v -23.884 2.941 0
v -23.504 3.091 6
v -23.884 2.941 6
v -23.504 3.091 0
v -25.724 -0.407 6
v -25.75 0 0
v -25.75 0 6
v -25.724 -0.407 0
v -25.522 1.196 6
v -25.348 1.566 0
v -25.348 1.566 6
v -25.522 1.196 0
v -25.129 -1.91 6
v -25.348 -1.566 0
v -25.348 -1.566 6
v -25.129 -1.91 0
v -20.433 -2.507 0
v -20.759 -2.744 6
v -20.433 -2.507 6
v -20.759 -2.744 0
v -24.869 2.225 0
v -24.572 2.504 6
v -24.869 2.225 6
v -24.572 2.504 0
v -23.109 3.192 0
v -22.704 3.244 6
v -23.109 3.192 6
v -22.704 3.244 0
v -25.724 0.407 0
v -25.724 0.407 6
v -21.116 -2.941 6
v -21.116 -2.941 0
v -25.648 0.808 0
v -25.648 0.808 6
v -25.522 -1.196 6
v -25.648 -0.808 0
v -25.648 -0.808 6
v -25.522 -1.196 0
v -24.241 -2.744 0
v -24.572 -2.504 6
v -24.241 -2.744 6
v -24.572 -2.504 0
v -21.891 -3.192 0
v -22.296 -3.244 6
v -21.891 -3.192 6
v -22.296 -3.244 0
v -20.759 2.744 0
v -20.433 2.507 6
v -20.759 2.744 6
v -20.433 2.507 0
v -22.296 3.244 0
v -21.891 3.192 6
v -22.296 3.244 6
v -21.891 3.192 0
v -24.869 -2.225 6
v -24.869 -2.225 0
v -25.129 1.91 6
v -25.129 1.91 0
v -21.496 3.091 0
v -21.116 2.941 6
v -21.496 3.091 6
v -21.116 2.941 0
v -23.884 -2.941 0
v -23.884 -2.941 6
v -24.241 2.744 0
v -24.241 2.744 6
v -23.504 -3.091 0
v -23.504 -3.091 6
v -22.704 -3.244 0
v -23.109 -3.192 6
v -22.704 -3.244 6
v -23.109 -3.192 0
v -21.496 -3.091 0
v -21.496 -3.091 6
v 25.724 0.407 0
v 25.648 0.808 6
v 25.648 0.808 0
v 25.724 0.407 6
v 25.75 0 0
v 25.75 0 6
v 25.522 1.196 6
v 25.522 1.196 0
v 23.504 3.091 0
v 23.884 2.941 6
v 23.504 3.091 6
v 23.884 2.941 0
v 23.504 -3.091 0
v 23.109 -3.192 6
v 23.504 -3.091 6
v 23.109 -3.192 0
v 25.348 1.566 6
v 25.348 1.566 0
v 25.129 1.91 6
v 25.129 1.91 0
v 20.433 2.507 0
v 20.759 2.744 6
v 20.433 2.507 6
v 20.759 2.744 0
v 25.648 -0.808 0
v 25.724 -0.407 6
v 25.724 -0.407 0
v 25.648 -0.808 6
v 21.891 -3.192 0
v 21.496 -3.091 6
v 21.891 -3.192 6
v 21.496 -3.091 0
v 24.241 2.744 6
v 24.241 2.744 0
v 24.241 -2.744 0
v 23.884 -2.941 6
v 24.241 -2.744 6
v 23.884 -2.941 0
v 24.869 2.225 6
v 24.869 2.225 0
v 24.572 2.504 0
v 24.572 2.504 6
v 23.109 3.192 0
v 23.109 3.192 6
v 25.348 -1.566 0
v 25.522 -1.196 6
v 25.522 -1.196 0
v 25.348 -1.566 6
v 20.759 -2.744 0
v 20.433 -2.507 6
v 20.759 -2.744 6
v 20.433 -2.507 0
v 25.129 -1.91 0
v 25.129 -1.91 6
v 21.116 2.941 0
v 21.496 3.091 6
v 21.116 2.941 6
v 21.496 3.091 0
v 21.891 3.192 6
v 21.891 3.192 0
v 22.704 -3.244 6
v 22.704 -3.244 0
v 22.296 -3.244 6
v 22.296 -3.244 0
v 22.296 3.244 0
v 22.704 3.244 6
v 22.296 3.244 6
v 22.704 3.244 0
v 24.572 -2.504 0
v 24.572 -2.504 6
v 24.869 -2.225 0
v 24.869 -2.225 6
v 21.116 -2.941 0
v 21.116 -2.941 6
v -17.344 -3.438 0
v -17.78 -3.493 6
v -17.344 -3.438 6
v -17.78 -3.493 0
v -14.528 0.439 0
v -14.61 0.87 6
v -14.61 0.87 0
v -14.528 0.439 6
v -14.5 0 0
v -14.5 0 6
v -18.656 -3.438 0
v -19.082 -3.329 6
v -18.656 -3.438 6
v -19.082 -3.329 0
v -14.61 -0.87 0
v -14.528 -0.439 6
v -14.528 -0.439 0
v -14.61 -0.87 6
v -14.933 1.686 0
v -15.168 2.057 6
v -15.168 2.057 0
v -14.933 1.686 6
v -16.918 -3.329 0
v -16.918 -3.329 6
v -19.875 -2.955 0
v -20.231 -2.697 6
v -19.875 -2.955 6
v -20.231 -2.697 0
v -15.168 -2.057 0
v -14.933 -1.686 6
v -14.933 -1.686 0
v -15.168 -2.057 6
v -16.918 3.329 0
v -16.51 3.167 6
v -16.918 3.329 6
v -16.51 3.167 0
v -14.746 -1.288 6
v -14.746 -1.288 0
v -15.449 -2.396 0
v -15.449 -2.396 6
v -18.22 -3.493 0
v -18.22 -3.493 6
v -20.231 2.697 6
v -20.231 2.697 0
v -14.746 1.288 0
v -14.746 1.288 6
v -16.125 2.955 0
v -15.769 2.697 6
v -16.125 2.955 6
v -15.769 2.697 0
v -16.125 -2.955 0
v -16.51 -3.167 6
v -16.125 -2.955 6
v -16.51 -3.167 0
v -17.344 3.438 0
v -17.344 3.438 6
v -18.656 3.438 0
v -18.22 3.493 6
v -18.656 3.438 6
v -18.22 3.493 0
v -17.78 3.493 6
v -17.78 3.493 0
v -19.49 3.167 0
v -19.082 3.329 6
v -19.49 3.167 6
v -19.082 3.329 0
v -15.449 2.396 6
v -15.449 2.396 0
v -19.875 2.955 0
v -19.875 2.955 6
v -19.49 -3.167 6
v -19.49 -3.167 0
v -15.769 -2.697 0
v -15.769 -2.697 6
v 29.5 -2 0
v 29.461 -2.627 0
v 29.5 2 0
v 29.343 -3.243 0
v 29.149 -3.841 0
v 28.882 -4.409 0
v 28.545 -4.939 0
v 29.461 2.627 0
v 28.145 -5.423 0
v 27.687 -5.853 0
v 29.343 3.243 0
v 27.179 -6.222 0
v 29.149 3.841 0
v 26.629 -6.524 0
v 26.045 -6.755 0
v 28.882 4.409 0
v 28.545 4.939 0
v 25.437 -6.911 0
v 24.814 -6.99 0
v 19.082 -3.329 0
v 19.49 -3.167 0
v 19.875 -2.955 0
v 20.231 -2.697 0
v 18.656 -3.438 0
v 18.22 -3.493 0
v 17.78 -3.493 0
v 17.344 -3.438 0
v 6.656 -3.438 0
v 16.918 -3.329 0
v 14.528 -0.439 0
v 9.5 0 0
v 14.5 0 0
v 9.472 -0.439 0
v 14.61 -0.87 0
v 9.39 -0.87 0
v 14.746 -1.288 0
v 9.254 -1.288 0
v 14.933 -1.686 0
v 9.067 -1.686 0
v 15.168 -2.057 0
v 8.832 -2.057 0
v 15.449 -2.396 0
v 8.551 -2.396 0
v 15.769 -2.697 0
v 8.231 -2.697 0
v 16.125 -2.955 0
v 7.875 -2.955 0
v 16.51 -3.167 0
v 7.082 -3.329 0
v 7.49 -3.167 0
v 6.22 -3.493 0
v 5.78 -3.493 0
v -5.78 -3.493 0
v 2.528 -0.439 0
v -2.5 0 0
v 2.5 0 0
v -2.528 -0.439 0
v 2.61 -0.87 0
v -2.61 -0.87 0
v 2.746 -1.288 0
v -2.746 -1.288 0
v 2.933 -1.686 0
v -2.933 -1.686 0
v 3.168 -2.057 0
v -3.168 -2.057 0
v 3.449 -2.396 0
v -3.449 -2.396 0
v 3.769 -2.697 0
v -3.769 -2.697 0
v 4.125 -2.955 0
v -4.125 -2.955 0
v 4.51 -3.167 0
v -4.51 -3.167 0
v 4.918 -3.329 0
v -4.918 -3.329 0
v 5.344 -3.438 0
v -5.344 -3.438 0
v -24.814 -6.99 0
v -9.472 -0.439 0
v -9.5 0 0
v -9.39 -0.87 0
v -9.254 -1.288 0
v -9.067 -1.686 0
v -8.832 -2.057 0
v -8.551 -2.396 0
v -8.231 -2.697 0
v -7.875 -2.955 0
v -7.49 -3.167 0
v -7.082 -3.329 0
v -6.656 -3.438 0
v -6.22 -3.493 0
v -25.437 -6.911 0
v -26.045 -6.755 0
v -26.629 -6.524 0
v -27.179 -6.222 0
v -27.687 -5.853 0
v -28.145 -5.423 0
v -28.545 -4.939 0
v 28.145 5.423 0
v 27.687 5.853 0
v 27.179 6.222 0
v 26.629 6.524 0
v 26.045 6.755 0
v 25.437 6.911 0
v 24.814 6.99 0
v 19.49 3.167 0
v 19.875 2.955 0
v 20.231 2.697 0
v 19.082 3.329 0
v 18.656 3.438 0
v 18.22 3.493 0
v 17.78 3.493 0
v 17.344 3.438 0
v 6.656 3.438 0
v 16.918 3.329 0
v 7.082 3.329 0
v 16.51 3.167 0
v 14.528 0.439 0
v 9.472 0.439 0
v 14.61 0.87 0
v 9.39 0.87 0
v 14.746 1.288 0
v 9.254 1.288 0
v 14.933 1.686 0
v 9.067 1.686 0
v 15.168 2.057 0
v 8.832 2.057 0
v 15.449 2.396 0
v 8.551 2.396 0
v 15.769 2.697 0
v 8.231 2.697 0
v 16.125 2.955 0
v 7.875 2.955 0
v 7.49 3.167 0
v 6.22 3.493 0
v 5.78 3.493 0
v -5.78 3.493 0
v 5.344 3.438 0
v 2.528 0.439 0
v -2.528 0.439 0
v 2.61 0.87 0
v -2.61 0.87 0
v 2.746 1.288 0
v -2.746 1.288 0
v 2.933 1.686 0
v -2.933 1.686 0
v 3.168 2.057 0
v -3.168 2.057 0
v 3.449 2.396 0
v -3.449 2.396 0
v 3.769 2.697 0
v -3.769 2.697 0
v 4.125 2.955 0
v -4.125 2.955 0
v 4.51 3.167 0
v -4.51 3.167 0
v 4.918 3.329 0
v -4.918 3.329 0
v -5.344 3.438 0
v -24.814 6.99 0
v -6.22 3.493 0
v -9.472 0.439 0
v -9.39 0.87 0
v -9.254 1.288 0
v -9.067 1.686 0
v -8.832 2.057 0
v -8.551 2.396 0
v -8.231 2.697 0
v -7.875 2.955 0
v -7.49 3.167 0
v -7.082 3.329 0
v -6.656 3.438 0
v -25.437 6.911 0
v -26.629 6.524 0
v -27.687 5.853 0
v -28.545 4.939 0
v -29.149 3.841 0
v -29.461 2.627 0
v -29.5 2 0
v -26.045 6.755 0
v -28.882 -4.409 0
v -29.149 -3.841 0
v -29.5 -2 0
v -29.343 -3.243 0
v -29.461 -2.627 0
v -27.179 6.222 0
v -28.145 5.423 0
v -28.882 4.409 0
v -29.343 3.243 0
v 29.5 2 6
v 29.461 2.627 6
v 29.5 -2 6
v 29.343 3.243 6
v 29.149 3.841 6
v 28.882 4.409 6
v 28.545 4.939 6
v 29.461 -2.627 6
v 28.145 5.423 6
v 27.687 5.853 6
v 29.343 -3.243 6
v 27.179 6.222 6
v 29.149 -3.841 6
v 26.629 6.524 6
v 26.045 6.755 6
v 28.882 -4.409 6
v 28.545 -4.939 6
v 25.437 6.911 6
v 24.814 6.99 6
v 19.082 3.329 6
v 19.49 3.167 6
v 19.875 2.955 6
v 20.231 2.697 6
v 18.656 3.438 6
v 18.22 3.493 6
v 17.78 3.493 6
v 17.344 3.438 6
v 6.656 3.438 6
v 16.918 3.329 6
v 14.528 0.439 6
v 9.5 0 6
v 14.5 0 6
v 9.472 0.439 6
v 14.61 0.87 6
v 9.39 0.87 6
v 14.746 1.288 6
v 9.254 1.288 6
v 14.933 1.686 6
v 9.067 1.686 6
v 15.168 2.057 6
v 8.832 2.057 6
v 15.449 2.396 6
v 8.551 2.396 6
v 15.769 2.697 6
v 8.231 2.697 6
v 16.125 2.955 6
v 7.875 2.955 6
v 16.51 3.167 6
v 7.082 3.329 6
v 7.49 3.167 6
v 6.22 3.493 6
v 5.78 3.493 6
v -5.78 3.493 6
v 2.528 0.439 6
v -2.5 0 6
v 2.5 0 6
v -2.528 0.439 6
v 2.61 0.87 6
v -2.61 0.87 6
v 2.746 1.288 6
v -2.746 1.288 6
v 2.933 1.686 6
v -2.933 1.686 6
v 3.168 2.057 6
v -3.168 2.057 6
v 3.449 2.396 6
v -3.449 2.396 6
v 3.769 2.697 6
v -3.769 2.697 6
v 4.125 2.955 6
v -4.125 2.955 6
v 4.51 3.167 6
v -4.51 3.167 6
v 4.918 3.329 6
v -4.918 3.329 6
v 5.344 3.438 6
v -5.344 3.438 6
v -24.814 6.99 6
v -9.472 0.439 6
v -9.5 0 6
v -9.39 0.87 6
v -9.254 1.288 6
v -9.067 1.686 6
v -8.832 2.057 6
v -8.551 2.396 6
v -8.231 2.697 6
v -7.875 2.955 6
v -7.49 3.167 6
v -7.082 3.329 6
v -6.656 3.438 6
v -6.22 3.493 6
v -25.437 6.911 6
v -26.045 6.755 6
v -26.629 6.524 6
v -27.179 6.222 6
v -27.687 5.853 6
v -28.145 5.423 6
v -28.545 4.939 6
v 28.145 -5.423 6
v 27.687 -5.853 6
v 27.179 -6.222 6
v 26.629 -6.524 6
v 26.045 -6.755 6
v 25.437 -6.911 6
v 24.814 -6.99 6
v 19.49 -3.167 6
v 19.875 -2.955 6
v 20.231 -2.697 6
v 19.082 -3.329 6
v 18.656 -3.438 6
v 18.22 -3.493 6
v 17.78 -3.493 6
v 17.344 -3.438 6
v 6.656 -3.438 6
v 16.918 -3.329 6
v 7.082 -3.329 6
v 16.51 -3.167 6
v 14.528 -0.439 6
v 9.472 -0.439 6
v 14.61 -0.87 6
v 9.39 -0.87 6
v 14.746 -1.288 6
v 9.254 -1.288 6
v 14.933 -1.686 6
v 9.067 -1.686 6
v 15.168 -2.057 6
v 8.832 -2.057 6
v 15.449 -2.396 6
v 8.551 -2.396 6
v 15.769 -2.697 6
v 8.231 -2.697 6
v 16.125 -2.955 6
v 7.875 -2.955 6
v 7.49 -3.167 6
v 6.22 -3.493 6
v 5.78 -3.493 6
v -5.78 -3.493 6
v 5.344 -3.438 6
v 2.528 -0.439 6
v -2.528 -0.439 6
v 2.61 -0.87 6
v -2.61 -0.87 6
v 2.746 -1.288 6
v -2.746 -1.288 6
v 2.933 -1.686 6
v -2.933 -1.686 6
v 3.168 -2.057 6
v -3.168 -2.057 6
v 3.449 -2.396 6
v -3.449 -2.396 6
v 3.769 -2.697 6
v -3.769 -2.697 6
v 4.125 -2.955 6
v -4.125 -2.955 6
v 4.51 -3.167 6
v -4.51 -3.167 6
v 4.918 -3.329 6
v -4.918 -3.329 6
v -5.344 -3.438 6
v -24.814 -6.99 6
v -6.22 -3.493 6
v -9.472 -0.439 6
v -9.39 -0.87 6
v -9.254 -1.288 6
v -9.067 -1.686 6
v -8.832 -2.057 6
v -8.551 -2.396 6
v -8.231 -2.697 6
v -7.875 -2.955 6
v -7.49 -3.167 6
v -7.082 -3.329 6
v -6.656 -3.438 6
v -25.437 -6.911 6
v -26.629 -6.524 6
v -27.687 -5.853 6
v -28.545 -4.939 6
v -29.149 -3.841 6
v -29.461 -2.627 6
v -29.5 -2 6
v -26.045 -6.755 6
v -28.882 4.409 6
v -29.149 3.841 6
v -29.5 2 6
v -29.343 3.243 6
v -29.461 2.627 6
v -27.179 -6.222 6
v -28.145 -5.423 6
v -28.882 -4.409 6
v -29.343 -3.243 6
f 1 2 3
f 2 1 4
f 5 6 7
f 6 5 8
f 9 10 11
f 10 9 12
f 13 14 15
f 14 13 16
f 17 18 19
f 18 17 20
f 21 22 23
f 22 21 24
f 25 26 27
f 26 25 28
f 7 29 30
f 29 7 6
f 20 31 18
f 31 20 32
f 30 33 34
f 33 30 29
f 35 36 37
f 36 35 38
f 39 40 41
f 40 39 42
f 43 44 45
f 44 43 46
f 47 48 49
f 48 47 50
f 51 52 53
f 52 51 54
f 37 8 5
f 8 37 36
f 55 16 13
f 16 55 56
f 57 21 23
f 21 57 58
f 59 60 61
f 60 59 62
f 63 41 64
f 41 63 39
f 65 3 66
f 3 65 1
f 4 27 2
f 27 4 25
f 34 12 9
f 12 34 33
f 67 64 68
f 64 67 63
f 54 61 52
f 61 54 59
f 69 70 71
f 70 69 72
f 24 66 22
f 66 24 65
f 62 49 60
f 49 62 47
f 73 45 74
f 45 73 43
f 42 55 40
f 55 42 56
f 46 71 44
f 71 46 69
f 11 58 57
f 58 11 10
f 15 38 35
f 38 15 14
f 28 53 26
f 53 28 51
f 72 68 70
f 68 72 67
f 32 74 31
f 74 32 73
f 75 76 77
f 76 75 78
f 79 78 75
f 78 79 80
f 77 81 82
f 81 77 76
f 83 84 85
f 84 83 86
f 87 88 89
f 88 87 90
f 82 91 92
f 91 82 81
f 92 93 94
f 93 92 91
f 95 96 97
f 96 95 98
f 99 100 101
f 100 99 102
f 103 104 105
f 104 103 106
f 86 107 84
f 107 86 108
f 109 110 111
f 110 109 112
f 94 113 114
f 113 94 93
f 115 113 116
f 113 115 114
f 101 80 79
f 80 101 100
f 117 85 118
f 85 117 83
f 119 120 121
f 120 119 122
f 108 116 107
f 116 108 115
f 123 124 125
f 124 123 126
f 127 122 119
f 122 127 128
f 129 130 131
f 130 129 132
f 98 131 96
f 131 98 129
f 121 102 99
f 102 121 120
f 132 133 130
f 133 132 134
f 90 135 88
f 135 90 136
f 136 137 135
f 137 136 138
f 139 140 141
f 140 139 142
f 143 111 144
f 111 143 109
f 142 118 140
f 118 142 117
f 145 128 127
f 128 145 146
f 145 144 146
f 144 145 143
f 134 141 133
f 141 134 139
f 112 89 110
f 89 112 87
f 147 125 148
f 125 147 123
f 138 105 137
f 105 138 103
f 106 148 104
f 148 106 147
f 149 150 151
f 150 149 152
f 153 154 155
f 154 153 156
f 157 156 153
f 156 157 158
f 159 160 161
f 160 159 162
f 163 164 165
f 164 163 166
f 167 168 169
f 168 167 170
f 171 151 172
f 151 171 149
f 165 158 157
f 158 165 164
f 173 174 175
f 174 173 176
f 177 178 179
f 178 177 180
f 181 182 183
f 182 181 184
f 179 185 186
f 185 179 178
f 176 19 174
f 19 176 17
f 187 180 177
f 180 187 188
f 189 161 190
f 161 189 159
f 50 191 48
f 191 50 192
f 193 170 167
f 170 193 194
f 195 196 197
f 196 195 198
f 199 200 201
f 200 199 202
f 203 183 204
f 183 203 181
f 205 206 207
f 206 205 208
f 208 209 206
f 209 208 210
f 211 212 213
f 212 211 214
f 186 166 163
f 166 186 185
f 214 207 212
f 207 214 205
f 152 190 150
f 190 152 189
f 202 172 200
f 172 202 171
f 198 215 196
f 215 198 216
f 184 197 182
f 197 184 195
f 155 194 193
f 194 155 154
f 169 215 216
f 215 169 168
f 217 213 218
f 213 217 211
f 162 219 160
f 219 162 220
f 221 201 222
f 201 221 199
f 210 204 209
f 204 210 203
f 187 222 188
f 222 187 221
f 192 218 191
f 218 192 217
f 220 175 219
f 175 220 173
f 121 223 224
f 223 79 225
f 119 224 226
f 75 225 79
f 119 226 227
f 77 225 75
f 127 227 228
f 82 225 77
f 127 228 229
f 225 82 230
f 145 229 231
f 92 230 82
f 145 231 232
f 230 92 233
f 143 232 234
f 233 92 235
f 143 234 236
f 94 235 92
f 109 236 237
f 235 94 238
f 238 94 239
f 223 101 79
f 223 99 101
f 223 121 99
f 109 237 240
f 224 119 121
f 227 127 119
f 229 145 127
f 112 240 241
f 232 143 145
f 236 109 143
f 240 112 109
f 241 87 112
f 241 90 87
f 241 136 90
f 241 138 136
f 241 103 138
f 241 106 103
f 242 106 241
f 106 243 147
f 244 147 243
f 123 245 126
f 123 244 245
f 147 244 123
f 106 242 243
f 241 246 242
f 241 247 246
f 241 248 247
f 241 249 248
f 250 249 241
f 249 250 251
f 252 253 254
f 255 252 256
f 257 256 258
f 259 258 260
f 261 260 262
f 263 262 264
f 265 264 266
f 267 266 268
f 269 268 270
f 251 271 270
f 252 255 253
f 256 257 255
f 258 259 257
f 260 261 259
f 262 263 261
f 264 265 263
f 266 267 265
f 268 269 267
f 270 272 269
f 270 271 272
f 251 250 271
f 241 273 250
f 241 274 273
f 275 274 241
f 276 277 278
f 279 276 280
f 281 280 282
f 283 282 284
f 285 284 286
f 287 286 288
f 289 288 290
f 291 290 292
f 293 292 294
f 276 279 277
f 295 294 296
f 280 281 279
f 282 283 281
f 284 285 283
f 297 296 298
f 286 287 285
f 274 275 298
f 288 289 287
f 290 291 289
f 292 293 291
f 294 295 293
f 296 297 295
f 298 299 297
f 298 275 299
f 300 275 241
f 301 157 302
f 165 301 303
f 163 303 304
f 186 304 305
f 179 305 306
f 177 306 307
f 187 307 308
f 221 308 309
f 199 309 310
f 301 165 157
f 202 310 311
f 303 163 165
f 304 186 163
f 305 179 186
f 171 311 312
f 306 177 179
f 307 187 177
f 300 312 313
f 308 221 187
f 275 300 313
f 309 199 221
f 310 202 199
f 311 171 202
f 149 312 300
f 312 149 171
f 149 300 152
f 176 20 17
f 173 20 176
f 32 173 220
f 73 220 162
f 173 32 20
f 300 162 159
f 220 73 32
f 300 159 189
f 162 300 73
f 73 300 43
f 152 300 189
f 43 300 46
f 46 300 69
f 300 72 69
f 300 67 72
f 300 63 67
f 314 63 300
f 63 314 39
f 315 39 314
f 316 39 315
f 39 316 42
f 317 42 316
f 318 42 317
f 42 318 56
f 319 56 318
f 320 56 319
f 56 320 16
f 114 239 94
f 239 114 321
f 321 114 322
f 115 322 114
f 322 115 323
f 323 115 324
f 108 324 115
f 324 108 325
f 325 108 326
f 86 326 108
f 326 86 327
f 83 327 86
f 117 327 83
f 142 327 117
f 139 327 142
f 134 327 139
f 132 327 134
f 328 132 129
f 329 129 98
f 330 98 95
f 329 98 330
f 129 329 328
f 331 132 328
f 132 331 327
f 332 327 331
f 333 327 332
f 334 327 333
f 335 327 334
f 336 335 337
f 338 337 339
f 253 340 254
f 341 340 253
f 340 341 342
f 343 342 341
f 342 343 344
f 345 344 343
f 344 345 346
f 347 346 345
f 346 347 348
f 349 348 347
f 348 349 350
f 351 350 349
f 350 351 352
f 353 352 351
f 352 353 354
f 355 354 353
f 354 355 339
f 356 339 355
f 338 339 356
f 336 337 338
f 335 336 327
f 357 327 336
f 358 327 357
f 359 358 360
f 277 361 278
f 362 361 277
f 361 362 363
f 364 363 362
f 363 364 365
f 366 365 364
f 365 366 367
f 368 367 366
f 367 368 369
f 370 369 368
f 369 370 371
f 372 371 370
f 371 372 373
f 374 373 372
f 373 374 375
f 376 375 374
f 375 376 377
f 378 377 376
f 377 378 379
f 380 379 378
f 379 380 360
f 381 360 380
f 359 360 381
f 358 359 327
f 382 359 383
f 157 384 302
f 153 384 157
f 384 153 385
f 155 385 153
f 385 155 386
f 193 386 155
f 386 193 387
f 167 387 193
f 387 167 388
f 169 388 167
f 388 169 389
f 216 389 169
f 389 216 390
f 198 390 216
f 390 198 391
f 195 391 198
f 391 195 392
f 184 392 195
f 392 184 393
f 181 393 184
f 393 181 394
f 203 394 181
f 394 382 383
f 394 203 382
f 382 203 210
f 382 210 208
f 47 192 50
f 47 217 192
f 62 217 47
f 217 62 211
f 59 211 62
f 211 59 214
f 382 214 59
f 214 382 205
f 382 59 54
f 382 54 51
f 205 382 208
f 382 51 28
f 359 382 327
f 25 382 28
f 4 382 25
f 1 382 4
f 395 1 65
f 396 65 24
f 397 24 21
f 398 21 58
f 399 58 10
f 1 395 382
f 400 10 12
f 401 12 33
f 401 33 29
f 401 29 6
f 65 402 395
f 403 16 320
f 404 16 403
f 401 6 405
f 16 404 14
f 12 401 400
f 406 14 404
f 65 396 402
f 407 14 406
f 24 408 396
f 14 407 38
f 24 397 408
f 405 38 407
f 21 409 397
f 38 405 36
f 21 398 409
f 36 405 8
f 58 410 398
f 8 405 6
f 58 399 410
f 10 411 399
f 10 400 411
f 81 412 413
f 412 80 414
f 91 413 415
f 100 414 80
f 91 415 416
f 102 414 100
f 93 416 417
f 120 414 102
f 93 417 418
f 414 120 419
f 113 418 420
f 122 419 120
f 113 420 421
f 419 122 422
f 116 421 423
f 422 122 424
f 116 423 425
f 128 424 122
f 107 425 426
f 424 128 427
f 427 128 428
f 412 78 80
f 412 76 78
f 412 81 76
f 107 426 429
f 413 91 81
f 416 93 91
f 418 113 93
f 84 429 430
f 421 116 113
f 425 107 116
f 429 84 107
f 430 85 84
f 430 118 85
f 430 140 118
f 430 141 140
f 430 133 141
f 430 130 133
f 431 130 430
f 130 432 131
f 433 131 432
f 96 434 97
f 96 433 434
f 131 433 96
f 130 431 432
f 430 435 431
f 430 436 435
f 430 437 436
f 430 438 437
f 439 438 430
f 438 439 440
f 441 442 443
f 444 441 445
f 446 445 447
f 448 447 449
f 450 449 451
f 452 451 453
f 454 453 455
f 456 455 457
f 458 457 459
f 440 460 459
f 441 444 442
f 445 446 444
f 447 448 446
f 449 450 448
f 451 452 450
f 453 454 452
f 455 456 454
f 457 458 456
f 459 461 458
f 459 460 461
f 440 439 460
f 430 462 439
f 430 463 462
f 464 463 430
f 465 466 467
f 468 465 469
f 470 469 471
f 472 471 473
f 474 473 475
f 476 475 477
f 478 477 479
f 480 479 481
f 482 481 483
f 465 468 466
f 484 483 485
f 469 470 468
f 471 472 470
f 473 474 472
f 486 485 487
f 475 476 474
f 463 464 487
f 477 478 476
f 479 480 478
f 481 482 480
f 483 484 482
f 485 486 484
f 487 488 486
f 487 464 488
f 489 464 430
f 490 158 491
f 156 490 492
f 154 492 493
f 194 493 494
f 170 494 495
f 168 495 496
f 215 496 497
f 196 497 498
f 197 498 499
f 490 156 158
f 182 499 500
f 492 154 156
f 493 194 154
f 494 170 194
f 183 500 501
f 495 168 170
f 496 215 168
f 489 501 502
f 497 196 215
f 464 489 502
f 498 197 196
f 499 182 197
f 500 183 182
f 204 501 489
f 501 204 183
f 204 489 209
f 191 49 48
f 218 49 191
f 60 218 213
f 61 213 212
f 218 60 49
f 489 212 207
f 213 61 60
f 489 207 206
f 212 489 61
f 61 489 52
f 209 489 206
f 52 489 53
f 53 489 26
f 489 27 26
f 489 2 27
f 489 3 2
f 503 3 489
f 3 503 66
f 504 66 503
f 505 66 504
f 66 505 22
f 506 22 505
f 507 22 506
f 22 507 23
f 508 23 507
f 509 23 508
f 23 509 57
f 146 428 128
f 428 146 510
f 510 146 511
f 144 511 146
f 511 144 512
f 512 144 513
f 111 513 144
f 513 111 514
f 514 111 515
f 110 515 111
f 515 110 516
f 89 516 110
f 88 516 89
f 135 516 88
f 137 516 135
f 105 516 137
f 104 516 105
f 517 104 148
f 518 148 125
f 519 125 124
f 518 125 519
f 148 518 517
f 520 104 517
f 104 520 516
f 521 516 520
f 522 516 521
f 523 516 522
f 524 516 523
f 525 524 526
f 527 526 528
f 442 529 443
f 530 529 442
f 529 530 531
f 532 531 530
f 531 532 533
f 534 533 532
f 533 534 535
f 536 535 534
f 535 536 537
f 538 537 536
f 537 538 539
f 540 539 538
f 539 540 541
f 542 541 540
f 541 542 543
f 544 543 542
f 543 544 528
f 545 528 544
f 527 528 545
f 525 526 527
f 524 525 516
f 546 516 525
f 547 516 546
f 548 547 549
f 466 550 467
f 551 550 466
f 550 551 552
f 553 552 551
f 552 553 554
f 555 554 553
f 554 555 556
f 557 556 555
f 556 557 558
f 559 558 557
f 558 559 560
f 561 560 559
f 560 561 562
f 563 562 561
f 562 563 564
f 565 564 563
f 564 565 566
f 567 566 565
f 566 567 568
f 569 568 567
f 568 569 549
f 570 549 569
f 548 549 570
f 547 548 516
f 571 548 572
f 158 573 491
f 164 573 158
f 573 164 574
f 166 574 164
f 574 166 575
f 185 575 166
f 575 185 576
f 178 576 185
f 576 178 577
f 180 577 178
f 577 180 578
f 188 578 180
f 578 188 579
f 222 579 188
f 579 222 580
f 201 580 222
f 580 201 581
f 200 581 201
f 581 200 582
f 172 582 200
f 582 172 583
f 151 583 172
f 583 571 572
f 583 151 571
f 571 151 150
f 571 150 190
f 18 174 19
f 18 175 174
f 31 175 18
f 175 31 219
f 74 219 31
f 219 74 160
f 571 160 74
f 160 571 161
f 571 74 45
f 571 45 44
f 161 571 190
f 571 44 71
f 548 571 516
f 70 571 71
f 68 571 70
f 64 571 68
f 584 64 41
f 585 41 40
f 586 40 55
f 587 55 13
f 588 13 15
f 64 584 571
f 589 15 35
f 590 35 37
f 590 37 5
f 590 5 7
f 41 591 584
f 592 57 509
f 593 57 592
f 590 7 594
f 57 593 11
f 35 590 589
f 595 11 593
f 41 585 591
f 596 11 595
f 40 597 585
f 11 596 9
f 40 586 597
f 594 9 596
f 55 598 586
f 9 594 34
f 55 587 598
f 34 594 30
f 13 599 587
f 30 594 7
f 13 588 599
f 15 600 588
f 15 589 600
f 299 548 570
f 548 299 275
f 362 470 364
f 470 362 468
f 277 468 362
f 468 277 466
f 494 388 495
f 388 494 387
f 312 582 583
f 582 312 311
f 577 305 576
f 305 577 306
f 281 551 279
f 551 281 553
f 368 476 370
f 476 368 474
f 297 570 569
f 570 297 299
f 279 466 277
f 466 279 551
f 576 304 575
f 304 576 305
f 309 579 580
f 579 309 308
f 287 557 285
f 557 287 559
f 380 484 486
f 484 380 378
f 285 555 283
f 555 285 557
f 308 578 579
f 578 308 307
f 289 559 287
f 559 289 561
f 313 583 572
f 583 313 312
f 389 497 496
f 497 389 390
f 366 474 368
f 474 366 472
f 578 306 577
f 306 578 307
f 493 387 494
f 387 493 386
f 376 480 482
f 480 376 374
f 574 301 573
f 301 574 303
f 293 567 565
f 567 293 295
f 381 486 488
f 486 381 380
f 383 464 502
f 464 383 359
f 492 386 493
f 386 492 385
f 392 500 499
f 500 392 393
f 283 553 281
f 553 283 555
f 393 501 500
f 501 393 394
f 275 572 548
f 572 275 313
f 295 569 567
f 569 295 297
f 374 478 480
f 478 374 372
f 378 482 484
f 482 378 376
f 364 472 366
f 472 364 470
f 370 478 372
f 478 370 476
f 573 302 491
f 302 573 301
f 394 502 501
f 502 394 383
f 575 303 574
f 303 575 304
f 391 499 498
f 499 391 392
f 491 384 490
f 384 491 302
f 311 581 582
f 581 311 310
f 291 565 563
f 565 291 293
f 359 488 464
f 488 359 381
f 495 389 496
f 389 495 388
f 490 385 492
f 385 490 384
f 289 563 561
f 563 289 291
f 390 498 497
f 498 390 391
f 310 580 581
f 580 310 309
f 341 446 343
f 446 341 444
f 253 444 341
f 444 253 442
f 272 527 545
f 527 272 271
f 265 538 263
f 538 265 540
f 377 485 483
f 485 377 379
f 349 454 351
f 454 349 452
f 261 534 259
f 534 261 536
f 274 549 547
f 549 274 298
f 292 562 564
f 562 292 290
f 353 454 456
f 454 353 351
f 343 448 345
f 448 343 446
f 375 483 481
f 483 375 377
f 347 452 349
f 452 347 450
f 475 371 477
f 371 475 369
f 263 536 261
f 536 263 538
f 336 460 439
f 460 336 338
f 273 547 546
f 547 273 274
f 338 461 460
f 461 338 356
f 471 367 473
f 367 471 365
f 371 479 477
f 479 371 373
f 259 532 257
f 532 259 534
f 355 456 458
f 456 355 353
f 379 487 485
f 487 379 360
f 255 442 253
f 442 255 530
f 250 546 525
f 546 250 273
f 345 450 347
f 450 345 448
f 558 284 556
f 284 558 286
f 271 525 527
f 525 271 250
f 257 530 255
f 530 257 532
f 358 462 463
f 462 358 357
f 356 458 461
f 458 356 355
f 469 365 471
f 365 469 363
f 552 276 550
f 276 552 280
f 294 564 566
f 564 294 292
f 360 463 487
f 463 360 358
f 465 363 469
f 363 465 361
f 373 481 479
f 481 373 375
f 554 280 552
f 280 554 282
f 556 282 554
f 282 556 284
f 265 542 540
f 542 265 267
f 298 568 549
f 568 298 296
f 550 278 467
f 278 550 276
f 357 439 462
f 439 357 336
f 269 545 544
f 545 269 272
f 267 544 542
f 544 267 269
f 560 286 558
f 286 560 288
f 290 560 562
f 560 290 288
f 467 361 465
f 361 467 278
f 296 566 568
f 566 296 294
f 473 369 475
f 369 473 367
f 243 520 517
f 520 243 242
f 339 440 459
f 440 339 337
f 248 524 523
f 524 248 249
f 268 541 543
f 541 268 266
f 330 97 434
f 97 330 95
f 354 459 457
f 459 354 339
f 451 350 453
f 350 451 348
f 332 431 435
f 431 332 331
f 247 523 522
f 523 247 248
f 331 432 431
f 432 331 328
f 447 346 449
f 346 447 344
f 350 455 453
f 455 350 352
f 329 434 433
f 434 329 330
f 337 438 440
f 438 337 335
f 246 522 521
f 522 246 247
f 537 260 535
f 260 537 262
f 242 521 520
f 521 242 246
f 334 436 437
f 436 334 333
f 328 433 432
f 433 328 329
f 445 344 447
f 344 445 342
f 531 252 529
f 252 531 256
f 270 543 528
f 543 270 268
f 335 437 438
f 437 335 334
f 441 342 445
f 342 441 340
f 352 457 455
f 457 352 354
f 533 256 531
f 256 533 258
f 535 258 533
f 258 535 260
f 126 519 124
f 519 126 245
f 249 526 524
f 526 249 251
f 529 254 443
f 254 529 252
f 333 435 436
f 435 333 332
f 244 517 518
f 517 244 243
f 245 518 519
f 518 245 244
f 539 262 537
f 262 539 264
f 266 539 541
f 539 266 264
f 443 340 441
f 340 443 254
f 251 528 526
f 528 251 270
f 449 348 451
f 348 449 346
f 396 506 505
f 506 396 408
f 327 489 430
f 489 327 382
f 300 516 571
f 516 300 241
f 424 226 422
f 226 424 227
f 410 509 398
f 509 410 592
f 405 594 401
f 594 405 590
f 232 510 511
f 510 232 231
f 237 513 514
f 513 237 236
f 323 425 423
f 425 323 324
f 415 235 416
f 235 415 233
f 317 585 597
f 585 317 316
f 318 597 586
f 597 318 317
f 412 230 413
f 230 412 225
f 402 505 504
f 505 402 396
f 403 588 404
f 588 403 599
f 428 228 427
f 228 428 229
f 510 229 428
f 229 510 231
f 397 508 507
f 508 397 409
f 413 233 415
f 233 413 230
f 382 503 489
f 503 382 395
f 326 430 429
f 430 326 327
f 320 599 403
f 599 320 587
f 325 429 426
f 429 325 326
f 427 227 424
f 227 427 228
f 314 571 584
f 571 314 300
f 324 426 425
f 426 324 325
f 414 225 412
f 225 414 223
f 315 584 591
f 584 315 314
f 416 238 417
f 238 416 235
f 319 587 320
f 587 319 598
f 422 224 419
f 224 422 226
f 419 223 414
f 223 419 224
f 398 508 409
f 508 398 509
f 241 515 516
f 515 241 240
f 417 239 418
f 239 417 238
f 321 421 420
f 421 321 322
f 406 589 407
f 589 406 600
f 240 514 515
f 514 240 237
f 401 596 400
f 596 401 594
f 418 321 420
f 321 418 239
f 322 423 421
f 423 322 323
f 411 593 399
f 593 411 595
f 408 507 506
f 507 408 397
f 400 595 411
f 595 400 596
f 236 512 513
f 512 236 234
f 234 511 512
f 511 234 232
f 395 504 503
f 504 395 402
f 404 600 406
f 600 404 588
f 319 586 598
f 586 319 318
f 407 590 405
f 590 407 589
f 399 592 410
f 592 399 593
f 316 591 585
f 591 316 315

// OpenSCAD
$fn = 50;


difference() {
	union() {
		hull() {
			translate(v = [-24.5000000000, 2.0000000000, 0]) {
				cylinder(h = 6, r = 5);
			}
			translate(v = [24.5000000000, 2.0000000000, 0]) {
				cylinder(h = 6, r = 5);
			}
			translate(v = [-24.5000000000, -2.0000000000, 0]) {
				cylinder(h = 6, r = 5);
			}
			translate(v = [24.5000000000, -2.0000000000, 0]) {
				cylinder(h = 6, r = 5);
			}
		}
	}
	union() {
		#translate(v = [-22.5000000000, 0.0000000000, -100.0000000000]) {
			cylinder(h = 200, r = 3.2500000000);
		}
		#translate(v = [-22.5000000000, 0.0000000000, -100.0000000000]) {
			cylinder(h = 200, r = 3.2500000000);
		}
		#translate(v = [22.5000000000, 0.0000000000, -100.0000000000]) {
			cylinder(h = 200, r = 3.2500000000);
		}
		#translate(v = [22.5000000000, 0.0000000000, -100.0000000000]) {
			cylinder(h = 200, r = 3.2500000000);
		}
		#translate(v = [-18.0000000000, 0, 0]) {
			cylinder(h = 6, r = 3.5000000000);
		}
		#translate(v = [-6.0000000000, 0, 0]) {
			cylinder(h = 6, r = 3.5000000000);
		}
		#translate(v = [6.0000000000, 0, 0]) {
			cylinder(h = 6, r = 3.5000000000);
		}
		#translate(v = [18.0000000000, 0, 0]) {
			cylinder(h = 6, r = 3.5000000000);
		}
	}
}
